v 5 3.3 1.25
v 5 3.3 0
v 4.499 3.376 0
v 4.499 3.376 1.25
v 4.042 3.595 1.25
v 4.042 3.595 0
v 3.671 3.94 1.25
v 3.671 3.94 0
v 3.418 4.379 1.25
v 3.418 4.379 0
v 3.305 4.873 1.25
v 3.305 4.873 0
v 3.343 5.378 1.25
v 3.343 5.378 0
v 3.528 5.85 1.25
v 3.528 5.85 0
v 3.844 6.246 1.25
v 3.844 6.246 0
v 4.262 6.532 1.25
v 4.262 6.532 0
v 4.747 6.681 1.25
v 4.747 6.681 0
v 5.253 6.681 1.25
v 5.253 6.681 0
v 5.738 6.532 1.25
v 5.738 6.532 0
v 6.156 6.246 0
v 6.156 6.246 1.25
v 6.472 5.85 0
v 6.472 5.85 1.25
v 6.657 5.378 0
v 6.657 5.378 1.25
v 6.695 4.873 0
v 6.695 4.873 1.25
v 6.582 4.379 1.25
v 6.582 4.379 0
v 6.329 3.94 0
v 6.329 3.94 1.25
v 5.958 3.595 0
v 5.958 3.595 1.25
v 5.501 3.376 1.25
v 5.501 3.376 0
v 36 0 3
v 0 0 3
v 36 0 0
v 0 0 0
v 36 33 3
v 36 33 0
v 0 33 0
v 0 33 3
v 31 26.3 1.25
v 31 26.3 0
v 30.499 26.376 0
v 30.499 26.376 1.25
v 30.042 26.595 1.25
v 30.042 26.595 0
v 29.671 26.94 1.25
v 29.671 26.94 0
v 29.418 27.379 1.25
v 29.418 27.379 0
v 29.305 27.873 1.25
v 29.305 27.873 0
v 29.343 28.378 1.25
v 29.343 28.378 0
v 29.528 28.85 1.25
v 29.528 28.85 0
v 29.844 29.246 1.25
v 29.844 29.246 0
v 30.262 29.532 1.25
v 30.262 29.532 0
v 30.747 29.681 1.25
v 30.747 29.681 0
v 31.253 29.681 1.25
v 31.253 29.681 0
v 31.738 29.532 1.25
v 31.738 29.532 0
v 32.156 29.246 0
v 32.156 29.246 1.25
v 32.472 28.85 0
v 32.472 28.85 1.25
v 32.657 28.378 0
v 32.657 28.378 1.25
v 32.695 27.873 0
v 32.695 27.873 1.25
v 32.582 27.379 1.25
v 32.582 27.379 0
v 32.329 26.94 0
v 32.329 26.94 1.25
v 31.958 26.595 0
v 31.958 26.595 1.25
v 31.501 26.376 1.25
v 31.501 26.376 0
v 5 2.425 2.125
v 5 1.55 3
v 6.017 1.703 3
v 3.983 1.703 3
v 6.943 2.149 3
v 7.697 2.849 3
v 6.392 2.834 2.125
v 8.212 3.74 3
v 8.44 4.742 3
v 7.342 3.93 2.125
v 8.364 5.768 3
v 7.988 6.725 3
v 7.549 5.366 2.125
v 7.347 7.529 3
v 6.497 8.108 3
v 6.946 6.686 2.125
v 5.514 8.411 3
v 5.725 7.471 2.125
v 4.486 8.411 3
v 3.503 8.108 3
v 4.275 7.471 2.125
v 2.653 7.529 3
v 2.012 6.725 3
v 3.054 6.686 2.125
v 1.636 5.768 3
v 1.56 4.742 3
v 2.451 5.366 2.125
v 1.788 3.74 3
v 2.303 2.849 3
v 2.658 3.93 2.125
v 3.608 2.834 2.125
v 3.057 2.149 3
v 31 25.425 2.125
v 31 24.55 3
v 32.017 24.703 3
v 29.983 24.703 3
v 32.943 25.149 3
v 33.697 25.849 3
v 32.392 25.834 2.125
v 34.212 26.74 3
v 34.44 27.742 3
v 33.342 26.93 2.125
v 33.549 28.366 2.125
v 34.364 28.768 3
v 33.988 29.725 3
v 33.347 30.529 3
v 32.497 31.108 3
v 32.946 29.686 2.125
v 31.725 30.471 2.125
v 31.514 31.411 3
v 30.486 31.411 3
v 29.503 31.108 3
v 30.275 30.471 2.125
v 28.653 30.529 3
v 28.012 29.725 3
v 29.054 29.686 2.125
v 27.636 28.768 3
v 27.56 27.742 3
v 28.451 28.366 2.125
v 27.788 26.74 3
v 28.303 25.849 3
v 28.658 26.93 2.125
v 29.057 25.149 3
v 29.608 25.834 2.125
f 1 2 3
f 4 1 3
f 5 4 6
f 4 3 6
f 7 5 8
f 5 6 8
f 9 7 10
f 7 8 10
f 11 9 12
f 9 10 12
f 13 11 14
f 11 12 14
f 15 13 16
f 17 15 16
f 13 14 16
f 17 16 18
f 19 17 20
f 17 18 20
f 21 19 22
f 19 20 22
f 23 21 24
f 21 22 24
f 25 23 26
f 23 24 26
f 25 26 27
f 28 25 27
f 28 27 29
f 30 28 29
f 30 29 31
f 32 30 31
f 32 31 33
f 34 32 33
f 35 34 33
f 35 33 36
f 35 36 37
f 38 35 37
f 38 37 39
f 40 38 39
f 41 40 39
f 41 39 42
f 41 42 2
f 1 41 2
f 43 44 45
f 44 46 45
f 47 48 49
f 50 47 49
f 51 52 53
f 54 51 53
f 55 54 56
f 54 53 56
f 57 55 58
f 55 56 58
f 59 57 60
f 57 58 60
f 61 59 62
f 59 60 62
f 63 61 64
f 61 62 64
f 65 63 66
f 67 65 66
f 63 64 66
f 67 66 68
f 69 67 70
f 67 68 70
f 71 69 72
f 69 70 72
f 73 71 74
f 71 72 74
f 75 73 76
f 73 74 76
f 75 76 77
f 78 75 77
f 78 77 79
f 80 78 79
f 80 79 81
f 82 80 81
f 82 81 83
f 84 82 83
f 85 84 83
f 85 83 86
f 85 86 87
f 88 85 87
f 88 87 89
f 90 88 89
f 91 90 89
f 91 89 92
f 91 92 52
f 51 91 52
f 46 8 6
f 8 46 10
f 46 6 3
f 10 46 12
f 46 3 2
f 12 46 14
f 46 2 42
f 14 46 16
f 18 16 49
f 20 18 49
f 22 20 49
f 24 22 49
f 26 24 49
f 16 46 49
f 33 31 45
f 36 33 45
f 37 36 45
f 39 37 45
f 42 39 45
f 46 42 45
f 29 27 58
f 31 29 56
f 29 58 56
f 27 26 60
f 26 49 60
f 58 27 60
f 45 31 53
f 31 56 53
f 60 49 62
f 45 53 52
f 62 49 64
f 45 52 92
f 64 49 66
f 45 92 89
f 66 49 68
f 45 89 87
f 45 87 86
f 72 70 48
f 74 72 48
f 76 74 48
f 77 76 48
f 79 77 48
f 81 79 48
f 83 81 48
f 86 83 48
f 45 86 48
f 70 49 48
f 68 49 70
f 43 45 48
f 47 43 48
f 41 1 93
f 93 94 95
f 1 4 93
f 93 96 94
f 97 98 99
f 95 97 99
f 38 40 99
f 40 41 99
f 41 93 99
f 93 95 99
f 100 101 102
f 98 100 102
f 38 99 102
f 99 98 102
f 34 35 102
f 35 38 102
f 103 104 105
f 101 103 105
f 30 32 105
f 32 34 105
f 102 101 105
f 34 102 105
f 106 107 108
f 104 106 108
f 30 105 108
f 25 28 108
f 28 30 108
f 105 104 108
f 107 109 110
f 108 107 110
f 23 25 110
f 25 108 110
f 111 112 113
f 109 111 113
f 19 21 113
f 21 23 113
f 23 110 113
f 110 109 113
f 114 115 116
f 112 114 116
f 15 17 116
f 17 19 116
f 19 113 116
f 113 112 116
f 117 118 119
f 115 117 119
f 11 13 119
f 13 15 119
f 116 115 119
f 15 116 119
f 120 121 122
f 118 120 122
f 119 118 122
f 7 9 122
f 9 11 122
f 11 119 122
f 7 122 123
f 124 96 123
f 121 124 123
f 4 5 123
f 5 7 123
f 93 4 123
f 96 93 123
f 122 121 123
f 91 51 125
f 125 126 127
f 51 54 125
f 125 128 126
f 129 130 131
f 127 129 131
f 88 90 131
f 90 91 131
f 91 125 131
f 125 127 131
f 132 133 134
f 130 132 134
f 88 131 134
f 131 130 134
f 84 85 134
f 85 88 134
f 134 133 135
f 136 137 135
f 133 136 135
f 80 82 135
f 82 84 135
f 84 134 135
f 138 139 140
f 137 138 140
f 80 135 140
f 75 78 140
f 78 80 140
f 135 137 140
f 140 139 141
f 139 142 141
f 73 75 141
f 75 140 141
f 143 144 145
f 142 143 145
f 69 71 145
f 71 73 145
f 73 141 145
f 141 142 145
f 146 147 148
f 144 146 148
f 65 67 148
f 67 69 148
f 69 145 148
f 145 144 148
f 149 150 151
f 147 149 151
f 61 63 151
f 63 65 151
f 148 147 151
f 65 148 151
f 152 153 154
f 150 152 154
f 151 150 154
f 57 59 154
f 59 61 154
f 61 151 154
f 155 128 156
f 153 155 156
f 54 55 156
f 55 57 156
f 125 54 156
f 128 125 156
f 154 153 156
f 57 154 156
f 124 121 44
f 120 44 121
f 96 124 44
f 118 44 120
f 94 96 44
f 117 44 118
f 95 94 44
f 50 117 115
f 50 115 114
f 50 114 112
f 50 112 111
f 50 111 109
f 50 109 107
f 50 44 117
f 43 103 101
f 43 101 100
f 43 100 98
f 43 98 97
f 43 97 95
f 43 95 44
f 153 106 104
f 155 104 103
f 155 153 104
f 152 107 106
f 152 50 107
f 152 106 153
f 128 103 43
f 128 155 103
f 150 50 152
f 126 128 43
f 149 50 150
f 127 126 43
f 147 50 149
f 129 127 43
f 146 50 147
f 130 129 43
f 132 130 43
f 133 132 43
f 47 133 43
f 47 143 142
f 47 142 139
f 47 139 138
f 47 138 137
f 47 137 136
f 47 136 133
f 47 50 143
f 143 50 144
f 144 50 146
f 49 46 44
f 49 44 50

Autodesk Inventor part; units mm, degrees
ref_plane "YZ Plane" through (0, 0, 0) normal (1, 0, 0) x (0, 1, 0)
ref_plane "XZ Plane" through (0, 0, 0) normal (0, 1, 0) x (-1, 0, 0)
ref_plane "XY Plane" through (0, 0, 0) normal (0, 0, 1) x (1, 0, 0)
sketch "Skizze1" plane through (0, 0, 0) normal (0, 0, 1) x (1, 0, 0)
  line L0 (-7.2, 0) -> (43.2, 0) projected
  line L1 (0, -6.6) -> (0, 39.6) projected
  line L2 (0, 0) -> (36, 0)
  line L3 (36, 0) -> (36, 33)
  line L4 (36, 33) -> (0, 33)
  line L5 (0, 33) -> (0, 0)
  dimension "d0" = 36
  dimension "d1" = 33
extrude "Extrusion1" add sketch "Skizze1" along normal blind 3
sketch "Skizze2" plane through (0, 0, 3) normal (0, 0, 1) x (1, 0, 0)
  line L0 (0, 0) -> (36, 0) projected
  line L1 (36, 0) -> (36, 33) projected
  line L2 (36, 33) -> (0, 33) projected
  line L3 (0, 33) -> (0, 0) projected
  line L4 (5, 28) -> (31, 28)
  line L5 (31, 28) -> (31, 5)
  line L6 (31, 5) -> (5, 5)
  line L7 (5, 5) -> (5, 28)
  line L8 (18, 33) -> (18, 0)
  line L9 (36, 16.5) -> (0, 16.5)
  dimension "d4" = 26
  dimension "d5" = 23
hole "Bohrung1" at (31, 28, 3) at (5, 5, 3) direction (0, 0, -1) diameter 3.4 end through all countersink diameter 6.9 countersink angle 90
properties part number "13_1087_014"
